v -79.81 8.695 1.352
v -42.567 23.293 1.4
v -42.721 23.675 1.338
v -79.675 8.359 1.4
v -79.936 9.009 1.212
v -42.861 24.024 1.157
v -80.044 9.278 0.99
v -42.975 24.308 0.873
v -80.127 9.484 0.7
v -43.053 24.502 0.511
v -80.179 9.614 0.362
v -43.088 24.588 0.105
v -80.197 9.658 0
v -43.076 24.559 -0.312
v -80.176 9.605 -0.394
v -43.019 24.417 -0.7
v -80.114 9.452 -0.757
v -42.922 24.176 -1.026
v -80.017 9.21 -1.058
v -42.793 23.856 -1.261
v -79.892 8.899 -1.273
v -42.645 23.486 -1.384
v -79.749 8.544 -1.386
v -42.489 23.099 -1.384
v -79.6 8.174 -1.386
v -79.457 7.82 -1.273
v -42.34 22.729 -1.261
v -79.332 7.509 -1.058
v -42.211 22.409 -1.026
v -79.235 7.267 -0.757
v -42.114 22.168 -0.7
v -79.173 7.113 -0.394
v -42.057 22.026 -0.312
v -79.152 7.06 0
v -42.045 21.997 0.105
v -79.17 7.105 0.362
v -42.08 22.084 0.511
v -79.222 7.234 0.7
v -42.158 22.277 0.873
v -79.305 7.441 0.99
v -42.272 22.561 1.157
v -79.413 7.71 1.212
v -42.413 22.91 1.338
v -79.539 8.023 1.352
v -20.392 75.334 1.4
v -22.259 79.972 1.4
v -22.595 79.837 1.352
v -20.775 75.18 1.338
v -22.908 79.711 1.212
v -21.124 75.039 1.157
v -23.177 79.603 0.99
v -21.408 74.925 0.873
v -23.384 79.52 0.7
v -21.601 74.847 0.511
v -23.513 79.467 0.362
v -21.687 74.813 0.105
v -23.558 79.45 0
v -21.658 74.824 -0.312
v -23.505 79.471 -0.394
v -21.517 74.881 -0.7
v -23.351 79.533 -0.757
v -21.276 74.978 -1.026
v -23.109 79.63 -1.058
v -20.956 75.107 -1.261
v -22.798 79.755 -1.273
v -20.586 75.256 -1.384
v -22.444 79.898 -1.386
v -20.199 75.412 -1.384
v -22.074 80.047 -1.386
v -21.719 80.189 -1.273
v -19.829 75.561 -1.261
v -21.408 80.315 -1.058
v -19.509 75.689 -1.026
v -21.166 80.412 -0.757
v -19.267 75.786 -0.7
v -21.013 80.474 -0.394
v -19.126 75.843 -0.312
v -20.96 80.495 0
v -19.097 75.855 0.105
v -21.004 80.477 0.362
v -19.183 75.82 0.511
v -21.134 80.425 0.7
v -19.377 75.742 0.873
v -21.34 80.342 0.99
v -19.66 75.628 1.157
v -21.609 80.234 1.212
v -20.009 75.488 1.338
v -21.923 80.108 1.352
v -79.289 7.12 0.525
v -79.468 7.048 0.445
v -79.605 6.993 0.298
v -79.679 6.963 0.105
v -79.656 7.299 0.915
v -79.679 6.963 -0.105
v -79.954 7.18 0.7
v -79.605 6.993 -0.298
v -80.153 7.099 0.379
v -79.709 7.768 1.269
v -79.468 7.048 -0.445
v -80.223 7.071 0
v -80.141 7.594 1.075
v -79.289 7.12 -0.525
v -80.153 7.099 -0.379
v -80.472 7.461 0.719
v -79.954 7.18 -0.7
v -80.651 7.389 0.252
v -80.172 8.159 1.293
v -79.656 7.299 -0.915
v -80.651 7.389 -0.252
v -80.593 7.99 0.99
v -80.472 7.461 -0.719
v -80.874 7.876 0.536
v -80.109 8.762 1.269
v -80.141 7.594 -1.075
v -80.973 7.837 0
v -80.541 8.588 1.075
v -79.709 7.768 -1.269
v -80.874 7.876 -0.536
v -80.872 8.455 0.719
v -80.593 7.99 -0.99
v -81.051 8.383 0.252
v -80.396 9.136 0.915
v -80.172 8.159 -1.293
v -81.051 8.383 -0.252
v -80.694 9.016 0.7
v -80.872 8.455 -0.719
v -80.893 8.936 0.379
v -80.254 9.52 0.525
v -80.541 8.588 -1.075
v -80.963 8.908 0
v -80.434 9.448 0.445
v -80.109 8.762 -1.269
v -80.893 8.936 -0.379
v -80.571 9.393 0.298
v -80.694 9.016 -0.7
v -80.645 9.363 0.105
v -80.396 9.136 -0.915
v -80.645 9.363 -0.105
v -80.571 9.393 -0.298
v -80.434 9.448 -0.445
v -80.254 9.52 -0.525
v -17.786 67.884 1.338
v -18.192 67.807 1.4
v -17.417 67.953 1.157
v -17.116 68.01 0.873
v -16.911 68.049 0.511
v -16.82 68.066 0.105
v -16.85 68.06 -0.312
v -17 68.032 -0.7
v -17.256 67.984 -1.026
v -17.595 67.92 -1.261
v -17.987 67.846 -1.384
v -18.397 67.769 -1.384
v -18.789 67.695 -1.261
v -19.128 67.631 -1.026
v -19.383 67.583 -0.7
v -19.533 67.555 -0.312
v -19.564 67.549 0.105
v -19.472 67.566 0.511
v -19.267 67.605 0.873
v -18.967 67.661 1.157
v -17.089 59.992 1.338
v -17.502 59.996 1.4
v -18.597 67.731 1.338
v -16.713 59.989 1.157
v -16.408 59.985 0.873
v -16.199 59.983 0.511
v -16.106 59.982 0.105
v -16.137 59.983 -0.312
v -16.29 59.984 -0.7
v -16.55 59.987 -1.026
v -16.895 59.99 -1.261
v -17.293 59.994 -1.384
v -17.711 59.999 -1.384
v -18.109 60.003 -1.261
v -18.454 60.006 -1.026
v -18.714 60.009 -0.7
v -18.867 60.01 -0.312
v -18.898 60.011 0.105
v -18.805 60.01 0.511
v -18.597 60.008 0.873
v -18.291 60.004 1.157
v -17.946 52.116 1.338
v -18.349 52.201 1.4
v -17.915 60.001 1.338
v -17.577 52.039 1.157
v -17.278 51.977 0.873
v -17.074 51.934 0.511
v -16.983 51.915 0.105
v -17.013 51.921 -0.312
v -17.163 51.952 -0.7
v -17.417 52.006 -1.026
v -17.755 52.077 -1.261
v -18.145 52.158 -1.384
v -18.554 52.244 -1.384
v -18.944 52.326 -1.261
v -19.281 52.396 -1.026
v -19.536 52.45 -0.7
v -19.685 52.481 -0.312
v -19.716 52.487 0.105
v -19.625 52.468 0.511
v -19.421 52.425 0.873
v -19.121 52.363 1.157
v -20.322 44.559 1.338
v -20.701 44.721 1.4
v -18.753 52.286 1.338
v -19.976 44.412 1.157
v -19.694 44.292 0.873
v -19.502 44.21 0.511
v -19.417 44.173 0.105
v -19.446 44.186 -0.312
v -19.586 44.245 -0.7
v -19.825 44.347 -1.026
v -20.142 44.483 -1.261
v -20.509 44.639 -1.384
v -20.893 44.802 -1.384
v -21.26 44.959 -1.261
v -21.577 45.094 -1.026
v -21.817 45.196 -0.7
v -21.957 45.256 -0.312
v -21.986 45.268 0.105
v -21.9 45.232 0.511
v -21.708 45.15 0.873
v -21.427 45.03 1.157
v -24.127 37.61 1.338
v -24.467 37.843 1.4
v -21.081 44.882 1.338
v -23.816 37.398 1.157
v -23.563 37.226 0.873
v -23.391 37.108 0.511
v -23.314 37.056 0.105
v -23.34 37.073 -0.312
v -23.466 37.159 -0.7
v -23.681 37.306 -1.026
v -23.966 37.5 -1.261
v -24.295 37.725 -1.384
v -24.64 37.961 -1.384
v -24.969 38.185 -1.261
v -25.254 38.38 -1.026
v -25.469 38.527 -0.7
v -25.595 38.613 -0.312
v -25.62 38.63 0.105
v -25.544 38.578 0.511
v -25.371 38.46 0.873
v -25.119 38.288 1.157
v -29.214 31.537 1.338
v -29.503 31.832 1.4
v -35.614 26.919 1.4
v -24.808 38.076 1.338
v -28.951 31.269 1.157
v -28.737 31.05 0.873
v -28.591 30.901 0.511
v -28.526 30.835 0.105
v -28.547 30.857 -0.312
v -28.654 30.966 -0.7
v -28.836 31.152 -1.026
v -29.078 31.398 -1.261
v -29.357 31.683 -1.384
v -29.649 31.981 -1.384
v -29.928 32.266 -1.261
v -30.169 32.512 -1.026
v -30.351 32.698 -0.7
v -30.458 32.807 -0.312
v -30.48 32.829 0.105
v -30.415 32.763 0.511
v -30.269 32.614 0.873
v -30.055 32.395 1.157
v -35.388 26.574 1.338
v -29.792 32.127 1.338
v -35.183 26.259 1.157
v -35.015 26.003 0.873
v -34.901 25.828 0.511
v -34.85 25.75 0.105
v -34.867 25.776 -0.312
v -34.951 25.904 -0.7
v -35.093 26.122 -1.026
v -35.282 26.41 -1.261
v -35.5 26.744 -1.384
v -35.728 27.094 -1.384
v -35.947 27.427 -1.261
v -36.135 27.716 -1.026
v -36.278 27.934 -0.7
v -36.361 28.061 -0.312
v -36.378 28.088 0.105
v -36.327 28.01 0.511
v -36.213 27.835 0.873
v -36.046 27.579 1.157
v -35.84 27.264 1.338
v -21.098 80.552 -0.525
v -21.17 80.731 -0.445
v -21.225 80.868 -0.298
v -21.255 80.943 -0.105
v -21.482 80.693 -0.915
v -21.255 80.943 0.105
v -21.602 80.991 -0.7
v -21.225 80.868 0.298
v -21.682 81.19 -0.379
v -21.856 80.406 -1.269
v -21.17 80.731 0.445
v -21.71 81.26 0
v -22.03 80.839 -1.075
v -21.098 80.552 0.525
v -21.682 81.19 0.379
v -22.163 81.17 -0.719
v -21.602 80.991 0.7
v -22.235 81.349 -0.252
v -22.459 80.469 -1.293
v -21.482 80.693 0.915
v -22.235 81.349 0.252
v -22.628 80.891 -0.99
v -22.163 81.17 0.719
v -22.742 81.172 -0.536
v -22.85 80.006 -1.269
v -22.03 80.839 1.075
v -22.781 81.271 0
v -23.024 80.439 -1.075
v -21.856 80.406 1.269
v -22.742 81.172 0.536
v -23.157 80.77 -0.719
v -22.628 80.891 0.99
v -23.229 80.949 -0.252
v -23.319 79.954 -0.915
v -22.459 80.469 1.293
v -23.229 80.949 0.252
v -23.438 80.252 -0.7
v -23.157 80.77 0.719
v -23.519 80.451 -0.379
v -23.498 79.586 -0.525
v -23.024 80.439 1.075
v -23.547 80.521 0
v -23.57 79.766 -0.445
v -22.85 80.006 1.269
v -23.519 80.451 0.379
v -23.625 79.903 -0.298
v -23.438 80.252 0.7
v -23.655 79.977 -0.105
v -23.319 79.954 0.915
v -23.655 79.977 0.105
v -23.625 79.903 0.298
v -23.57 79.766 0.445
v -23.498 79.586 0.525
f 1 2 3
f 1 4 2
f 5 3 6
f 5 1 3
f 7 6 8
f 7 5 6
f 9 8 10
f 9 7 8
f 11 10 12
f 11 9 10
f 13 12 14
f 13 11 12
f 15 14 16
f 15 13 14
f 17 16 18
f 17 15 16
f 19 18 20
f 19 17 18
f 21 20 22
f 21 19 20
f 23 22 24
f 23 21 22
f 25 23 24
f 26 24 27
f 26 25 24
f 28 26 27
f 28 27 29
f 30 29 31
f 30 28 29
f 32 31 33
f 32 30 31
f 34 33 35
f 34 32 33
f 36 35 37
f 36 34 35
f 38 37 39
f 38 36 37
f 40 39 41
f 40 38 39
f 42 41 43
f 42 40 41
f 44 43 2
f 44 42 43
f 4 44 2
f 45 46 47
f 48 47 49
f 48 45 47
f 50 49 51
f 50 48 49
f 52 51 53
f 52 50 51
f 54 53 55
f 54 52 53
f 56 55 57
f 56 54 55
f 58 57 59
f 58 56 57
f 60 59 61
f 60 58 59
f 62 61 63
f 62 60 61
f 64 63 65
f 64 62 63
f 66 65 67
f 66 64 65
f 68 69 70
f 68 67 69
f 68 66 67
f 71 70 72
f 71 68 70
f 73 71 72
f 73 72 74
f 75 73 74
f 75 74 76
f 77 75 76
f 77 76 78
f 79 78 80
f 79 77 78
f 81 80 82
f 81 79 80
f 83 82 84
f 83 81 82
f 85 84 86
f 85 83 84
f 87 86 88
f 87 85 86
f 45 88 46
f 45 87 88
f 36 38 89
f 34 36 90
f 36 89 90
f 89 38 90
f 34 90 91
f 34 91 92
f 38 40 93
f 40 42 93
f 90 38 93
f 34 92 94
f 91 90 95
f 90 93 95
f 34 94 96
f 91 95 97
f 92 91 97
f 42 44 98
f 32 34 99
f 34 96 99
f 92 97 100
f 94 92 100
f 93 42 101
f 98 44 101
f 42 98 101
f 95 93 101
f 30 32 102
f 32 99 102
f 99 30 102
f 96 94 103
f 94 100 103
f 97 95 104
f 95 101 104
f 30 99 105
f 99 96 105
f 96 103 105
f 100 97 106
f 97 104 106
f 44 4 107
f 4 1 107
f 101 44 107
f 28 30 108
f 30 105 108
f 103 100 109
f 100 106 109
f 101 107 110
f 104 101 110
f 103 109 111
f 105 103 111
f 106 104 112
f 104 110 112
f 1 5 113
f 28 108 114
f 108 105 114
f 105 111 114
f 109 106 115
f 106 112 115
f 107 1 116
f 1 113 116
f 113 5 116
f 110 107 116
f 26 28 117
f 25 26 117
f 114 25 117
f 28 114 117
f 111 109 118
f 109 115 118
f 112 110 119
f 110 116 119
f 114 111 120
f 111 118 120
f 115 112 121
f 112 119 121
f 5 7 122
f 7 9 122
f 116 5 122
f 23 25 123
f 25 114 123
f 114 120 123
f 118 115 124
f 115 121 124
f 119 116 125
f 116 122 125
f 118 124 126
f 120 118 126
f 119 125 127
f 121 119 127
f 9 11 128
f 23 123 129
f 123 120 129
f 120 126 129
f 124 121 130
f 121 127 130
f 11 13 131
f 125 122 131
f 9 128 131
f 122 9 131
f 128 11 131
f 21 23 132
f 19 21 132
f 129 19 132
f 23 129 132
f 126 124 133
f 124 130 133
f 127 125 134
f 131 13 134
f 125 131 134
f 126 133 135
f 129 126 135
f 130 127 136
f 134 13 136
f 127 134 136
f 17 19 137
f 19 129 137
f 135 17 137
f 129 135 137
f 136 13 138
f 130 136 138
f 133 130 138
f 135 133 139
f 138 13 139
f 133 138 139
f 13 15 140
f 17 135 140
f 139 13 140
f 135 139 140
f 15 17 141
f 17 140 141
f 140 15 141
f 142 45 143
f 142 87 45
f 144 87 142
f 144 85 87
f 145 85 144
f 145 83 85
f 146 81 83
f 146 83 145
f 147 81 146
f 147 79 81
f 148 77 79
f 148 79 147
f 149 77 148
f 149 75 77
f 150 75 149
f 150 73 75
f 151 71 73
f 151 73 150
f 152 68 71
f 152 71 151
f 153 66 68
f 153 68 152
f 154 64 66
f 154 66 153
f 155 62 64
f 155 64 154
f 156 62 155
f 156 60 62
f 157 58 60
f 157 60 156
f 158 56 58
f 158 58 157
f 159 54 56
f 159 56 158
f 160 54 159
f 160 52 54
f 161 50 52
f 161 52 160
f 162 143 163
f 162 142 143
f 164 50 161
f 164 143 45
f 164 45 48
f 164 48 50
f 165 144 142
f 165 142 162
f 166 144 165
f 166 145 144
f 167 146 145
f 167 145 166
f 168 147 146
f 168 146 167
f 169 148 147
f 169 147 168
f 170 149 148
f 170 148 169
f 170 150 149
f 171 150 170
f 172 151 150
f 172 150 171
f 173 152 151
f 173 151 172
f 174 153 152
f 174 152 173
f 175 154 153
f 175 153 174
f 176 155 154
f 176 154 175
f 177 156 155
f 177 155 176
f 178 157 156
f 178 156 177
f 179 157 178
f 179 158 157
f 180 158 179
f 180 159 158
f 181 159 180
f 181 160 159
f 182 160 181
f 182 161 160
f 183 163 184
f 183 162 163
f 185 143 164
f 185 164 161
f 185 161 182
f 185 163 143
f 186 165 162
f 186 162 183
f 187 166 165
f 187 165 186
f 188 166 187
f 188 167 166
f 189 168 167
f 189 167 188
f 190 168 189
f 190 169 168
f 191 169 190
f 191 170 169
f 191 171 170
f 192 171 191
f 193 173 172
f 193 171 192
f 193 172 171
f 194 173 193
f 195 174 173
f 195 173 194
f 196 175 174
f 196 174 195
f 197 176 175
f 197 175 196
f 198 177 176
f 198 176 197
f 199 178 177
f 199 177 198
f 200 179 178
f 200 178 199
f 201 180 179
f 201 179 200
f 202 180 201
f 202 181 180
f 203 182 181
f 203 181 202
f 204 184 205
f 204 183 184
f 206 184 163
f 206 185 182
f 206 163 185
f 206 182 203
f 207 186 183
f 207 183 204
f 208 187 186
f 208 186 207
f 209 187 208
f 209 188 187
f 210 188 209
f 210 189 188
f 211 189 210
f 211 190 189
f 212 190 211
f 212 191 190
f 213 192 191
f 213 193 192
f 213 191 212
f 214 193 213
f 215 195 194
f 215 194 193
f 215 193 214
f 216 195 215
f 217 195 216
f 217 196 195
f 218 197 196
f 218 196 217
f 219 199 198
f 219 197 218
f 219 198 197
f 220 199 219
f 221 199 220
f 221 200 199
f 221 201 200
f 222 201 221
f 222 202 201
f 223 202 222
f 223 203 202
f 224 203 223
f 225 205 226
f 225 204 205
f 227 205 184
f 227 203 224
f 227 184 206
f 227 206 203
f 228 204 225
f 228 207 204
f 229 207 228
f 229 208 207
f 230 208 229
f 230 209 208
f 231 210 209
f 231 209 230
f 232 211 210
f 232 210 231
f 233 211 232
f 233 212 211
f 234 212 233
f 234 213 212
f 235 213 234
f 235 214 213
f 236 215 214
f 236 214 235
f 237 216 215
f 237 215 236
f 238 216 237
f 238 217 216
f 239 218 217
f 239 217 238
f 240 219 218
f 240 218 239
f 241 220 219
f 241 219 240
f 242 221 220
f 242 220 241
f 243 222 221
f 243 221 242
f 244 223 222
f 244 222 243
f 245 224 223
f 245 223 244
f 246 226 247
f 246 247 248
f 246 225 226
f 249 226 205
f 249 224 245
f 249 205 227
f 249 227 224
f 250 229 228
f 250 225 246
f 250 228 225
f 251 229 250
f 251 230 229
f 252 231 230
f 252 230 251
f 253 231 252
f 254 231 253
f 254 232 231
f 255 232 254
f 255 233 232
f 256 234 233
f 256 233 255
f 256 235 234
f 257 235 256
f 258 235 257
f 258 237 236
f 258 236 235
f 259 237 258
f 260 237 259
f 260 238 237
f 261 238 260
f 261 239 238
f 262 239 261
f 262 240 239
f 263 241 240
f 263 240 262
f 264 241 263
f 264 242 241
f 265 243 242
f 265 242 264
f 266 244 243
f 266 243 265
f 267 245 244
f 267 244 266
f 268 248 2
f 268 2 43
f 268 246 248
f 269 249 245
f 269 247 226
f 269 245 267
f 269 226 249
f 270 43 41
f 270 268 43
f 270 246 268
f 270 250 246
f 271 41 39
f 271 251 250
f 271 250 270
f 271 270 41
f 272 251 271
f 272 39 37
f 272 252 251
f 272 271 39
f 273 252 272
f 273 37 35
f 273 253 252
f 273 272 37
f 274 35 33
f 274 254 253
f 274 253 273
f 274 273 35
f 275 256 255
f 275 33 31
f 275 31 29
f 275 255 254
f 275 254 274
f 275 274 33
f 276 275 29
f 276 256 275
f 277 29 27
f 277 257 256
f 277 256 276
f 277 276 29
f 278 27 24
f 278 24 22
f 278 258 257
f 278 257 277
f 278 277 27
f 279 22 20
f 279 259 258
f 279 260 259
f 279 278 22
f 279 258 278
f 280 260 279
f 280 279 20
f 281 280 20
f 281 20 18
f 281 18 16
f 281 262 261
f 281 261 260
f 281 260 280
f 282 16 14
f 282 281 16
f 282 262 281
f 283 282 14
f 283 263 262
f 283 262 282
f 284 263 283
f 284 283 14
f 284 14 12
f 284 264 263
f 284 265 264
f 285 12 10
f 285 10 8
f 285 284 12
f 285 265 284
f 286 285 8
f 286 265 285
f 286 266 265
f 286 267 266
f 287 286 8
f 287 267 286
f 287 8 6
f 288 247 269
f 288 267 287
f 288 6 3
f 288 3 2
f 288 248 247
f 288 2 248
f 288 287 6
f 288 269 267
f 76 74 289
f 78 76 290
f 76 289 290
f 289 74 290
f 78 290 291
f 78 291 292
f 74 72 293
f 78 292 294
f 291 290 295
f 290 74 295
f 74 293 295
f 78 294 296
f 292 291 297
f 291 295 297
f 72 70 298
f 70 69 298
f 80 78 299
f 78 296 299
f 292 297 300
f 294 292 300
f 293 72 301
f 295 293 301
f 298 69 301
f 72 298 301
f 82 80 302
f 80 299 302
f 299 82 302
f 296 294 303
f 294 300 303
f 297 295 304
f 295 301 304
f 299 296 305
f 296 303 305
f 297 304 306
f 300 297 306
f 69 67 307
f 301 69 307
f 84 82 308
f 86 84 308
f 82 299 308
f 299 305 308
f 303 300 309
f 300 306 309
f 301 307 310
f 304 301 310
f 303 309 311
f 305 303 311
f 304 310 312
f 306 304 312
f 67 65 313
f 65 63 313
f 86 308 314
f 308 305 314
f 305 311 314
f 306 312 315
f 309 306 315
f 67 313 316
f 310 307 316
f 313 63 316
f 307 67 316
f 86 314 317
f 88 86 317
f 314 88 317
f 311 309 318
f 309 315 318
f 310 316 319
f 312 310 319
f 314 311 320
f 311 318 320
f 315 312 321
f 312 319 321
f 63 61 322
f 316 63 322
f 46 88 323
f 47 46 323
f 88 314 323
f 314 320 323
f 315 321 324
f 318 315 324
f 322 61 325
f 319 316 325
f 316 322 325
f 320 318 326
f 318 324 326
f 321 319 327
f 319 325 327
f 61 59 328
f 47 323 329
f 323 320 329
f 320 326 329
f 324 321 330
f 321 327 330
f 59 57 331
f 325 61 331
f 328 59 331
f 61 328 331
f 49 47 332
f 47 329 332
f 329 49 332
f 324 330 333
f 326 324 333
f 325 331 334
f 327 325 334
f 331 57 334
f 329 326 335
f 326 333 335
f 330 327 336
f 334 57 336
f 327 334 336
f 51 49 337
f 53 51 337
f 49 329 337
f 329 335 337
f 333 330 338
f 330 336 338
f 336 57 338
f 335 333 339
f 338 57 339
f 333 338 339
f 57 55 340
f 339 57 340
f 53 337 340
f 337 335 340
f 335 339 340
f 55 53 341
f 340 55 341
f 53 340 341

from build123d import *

# Parameters (mm, degrees)
SKETCH_3_R = 1.4


with BuildPart() as part:
    # 扫描1: sweep along a path in 草图2
    with BuildLine(Plane.XY) as sweep_1_path:
        Line((-22.258775921, 79.972270587), (-20.392109255, 75.333784243))
        ThreePointArc((-20.392109255, 75.333784243), (-20.701297553, 44.720670994), (-42.566666667, 23.292560165))
        Line((-42.566666667, 23.292560165), (-79.674557412, 8.359226832))
    # 草图3 → 扫描1 (sweep)
    with BuildSketch(Plane(origin=(-79.674557412, 8.359226832, 0), x_dir=(0, 0, 1), z_dir=(-0.9276972686292776, -0.3733333333333338, 0))):
        Circle(SKETCH_3_R)
    sweep(path=sweep_1_path.line)

    # 草图4 → 旋转1 (revolve)
    with BuildSketch(Plane(origin=(-65.674557412, -26.429420742, 0), x_dir=(0, 0, 1), z_dir=(-0.9276972686292776, -0.37333333333333385, 0))):
        with BuildLine():
            Line((0, 38.9), (0, 36.1))
            ThreePointArc((0, 36.1), (-1.4, 37.5), (0, 38.9))
        make_face()
    revolve(axis=Axis((-80.197224079, 9.658003008, 0), (0.37333333333333635, -0.9276972686292765, 0)))

    # 草图6 → 旋转2 (revolve)
    with BuildSketch(Plane(origin=(-30.8, 76.535024662, 0), x_dir=(0.9276972686292776, 0.37333333333333374, 0), z_dir=(-0.3733333333333337, 0.9276972686292775, 0))):
        with BuildLine():
            Line((7.806908727, 0), (10.606908727, 0))
            ThreePointArc((10.606908727, 0), (9.206908727, 1.4), (7.806908727, 0))
        make_face()
    revolve(axis=Axis((-23.557552098, 79.44960392, 0), (0.9276972686292784, 0.3733333333333317, 0)))


solid = part.part
